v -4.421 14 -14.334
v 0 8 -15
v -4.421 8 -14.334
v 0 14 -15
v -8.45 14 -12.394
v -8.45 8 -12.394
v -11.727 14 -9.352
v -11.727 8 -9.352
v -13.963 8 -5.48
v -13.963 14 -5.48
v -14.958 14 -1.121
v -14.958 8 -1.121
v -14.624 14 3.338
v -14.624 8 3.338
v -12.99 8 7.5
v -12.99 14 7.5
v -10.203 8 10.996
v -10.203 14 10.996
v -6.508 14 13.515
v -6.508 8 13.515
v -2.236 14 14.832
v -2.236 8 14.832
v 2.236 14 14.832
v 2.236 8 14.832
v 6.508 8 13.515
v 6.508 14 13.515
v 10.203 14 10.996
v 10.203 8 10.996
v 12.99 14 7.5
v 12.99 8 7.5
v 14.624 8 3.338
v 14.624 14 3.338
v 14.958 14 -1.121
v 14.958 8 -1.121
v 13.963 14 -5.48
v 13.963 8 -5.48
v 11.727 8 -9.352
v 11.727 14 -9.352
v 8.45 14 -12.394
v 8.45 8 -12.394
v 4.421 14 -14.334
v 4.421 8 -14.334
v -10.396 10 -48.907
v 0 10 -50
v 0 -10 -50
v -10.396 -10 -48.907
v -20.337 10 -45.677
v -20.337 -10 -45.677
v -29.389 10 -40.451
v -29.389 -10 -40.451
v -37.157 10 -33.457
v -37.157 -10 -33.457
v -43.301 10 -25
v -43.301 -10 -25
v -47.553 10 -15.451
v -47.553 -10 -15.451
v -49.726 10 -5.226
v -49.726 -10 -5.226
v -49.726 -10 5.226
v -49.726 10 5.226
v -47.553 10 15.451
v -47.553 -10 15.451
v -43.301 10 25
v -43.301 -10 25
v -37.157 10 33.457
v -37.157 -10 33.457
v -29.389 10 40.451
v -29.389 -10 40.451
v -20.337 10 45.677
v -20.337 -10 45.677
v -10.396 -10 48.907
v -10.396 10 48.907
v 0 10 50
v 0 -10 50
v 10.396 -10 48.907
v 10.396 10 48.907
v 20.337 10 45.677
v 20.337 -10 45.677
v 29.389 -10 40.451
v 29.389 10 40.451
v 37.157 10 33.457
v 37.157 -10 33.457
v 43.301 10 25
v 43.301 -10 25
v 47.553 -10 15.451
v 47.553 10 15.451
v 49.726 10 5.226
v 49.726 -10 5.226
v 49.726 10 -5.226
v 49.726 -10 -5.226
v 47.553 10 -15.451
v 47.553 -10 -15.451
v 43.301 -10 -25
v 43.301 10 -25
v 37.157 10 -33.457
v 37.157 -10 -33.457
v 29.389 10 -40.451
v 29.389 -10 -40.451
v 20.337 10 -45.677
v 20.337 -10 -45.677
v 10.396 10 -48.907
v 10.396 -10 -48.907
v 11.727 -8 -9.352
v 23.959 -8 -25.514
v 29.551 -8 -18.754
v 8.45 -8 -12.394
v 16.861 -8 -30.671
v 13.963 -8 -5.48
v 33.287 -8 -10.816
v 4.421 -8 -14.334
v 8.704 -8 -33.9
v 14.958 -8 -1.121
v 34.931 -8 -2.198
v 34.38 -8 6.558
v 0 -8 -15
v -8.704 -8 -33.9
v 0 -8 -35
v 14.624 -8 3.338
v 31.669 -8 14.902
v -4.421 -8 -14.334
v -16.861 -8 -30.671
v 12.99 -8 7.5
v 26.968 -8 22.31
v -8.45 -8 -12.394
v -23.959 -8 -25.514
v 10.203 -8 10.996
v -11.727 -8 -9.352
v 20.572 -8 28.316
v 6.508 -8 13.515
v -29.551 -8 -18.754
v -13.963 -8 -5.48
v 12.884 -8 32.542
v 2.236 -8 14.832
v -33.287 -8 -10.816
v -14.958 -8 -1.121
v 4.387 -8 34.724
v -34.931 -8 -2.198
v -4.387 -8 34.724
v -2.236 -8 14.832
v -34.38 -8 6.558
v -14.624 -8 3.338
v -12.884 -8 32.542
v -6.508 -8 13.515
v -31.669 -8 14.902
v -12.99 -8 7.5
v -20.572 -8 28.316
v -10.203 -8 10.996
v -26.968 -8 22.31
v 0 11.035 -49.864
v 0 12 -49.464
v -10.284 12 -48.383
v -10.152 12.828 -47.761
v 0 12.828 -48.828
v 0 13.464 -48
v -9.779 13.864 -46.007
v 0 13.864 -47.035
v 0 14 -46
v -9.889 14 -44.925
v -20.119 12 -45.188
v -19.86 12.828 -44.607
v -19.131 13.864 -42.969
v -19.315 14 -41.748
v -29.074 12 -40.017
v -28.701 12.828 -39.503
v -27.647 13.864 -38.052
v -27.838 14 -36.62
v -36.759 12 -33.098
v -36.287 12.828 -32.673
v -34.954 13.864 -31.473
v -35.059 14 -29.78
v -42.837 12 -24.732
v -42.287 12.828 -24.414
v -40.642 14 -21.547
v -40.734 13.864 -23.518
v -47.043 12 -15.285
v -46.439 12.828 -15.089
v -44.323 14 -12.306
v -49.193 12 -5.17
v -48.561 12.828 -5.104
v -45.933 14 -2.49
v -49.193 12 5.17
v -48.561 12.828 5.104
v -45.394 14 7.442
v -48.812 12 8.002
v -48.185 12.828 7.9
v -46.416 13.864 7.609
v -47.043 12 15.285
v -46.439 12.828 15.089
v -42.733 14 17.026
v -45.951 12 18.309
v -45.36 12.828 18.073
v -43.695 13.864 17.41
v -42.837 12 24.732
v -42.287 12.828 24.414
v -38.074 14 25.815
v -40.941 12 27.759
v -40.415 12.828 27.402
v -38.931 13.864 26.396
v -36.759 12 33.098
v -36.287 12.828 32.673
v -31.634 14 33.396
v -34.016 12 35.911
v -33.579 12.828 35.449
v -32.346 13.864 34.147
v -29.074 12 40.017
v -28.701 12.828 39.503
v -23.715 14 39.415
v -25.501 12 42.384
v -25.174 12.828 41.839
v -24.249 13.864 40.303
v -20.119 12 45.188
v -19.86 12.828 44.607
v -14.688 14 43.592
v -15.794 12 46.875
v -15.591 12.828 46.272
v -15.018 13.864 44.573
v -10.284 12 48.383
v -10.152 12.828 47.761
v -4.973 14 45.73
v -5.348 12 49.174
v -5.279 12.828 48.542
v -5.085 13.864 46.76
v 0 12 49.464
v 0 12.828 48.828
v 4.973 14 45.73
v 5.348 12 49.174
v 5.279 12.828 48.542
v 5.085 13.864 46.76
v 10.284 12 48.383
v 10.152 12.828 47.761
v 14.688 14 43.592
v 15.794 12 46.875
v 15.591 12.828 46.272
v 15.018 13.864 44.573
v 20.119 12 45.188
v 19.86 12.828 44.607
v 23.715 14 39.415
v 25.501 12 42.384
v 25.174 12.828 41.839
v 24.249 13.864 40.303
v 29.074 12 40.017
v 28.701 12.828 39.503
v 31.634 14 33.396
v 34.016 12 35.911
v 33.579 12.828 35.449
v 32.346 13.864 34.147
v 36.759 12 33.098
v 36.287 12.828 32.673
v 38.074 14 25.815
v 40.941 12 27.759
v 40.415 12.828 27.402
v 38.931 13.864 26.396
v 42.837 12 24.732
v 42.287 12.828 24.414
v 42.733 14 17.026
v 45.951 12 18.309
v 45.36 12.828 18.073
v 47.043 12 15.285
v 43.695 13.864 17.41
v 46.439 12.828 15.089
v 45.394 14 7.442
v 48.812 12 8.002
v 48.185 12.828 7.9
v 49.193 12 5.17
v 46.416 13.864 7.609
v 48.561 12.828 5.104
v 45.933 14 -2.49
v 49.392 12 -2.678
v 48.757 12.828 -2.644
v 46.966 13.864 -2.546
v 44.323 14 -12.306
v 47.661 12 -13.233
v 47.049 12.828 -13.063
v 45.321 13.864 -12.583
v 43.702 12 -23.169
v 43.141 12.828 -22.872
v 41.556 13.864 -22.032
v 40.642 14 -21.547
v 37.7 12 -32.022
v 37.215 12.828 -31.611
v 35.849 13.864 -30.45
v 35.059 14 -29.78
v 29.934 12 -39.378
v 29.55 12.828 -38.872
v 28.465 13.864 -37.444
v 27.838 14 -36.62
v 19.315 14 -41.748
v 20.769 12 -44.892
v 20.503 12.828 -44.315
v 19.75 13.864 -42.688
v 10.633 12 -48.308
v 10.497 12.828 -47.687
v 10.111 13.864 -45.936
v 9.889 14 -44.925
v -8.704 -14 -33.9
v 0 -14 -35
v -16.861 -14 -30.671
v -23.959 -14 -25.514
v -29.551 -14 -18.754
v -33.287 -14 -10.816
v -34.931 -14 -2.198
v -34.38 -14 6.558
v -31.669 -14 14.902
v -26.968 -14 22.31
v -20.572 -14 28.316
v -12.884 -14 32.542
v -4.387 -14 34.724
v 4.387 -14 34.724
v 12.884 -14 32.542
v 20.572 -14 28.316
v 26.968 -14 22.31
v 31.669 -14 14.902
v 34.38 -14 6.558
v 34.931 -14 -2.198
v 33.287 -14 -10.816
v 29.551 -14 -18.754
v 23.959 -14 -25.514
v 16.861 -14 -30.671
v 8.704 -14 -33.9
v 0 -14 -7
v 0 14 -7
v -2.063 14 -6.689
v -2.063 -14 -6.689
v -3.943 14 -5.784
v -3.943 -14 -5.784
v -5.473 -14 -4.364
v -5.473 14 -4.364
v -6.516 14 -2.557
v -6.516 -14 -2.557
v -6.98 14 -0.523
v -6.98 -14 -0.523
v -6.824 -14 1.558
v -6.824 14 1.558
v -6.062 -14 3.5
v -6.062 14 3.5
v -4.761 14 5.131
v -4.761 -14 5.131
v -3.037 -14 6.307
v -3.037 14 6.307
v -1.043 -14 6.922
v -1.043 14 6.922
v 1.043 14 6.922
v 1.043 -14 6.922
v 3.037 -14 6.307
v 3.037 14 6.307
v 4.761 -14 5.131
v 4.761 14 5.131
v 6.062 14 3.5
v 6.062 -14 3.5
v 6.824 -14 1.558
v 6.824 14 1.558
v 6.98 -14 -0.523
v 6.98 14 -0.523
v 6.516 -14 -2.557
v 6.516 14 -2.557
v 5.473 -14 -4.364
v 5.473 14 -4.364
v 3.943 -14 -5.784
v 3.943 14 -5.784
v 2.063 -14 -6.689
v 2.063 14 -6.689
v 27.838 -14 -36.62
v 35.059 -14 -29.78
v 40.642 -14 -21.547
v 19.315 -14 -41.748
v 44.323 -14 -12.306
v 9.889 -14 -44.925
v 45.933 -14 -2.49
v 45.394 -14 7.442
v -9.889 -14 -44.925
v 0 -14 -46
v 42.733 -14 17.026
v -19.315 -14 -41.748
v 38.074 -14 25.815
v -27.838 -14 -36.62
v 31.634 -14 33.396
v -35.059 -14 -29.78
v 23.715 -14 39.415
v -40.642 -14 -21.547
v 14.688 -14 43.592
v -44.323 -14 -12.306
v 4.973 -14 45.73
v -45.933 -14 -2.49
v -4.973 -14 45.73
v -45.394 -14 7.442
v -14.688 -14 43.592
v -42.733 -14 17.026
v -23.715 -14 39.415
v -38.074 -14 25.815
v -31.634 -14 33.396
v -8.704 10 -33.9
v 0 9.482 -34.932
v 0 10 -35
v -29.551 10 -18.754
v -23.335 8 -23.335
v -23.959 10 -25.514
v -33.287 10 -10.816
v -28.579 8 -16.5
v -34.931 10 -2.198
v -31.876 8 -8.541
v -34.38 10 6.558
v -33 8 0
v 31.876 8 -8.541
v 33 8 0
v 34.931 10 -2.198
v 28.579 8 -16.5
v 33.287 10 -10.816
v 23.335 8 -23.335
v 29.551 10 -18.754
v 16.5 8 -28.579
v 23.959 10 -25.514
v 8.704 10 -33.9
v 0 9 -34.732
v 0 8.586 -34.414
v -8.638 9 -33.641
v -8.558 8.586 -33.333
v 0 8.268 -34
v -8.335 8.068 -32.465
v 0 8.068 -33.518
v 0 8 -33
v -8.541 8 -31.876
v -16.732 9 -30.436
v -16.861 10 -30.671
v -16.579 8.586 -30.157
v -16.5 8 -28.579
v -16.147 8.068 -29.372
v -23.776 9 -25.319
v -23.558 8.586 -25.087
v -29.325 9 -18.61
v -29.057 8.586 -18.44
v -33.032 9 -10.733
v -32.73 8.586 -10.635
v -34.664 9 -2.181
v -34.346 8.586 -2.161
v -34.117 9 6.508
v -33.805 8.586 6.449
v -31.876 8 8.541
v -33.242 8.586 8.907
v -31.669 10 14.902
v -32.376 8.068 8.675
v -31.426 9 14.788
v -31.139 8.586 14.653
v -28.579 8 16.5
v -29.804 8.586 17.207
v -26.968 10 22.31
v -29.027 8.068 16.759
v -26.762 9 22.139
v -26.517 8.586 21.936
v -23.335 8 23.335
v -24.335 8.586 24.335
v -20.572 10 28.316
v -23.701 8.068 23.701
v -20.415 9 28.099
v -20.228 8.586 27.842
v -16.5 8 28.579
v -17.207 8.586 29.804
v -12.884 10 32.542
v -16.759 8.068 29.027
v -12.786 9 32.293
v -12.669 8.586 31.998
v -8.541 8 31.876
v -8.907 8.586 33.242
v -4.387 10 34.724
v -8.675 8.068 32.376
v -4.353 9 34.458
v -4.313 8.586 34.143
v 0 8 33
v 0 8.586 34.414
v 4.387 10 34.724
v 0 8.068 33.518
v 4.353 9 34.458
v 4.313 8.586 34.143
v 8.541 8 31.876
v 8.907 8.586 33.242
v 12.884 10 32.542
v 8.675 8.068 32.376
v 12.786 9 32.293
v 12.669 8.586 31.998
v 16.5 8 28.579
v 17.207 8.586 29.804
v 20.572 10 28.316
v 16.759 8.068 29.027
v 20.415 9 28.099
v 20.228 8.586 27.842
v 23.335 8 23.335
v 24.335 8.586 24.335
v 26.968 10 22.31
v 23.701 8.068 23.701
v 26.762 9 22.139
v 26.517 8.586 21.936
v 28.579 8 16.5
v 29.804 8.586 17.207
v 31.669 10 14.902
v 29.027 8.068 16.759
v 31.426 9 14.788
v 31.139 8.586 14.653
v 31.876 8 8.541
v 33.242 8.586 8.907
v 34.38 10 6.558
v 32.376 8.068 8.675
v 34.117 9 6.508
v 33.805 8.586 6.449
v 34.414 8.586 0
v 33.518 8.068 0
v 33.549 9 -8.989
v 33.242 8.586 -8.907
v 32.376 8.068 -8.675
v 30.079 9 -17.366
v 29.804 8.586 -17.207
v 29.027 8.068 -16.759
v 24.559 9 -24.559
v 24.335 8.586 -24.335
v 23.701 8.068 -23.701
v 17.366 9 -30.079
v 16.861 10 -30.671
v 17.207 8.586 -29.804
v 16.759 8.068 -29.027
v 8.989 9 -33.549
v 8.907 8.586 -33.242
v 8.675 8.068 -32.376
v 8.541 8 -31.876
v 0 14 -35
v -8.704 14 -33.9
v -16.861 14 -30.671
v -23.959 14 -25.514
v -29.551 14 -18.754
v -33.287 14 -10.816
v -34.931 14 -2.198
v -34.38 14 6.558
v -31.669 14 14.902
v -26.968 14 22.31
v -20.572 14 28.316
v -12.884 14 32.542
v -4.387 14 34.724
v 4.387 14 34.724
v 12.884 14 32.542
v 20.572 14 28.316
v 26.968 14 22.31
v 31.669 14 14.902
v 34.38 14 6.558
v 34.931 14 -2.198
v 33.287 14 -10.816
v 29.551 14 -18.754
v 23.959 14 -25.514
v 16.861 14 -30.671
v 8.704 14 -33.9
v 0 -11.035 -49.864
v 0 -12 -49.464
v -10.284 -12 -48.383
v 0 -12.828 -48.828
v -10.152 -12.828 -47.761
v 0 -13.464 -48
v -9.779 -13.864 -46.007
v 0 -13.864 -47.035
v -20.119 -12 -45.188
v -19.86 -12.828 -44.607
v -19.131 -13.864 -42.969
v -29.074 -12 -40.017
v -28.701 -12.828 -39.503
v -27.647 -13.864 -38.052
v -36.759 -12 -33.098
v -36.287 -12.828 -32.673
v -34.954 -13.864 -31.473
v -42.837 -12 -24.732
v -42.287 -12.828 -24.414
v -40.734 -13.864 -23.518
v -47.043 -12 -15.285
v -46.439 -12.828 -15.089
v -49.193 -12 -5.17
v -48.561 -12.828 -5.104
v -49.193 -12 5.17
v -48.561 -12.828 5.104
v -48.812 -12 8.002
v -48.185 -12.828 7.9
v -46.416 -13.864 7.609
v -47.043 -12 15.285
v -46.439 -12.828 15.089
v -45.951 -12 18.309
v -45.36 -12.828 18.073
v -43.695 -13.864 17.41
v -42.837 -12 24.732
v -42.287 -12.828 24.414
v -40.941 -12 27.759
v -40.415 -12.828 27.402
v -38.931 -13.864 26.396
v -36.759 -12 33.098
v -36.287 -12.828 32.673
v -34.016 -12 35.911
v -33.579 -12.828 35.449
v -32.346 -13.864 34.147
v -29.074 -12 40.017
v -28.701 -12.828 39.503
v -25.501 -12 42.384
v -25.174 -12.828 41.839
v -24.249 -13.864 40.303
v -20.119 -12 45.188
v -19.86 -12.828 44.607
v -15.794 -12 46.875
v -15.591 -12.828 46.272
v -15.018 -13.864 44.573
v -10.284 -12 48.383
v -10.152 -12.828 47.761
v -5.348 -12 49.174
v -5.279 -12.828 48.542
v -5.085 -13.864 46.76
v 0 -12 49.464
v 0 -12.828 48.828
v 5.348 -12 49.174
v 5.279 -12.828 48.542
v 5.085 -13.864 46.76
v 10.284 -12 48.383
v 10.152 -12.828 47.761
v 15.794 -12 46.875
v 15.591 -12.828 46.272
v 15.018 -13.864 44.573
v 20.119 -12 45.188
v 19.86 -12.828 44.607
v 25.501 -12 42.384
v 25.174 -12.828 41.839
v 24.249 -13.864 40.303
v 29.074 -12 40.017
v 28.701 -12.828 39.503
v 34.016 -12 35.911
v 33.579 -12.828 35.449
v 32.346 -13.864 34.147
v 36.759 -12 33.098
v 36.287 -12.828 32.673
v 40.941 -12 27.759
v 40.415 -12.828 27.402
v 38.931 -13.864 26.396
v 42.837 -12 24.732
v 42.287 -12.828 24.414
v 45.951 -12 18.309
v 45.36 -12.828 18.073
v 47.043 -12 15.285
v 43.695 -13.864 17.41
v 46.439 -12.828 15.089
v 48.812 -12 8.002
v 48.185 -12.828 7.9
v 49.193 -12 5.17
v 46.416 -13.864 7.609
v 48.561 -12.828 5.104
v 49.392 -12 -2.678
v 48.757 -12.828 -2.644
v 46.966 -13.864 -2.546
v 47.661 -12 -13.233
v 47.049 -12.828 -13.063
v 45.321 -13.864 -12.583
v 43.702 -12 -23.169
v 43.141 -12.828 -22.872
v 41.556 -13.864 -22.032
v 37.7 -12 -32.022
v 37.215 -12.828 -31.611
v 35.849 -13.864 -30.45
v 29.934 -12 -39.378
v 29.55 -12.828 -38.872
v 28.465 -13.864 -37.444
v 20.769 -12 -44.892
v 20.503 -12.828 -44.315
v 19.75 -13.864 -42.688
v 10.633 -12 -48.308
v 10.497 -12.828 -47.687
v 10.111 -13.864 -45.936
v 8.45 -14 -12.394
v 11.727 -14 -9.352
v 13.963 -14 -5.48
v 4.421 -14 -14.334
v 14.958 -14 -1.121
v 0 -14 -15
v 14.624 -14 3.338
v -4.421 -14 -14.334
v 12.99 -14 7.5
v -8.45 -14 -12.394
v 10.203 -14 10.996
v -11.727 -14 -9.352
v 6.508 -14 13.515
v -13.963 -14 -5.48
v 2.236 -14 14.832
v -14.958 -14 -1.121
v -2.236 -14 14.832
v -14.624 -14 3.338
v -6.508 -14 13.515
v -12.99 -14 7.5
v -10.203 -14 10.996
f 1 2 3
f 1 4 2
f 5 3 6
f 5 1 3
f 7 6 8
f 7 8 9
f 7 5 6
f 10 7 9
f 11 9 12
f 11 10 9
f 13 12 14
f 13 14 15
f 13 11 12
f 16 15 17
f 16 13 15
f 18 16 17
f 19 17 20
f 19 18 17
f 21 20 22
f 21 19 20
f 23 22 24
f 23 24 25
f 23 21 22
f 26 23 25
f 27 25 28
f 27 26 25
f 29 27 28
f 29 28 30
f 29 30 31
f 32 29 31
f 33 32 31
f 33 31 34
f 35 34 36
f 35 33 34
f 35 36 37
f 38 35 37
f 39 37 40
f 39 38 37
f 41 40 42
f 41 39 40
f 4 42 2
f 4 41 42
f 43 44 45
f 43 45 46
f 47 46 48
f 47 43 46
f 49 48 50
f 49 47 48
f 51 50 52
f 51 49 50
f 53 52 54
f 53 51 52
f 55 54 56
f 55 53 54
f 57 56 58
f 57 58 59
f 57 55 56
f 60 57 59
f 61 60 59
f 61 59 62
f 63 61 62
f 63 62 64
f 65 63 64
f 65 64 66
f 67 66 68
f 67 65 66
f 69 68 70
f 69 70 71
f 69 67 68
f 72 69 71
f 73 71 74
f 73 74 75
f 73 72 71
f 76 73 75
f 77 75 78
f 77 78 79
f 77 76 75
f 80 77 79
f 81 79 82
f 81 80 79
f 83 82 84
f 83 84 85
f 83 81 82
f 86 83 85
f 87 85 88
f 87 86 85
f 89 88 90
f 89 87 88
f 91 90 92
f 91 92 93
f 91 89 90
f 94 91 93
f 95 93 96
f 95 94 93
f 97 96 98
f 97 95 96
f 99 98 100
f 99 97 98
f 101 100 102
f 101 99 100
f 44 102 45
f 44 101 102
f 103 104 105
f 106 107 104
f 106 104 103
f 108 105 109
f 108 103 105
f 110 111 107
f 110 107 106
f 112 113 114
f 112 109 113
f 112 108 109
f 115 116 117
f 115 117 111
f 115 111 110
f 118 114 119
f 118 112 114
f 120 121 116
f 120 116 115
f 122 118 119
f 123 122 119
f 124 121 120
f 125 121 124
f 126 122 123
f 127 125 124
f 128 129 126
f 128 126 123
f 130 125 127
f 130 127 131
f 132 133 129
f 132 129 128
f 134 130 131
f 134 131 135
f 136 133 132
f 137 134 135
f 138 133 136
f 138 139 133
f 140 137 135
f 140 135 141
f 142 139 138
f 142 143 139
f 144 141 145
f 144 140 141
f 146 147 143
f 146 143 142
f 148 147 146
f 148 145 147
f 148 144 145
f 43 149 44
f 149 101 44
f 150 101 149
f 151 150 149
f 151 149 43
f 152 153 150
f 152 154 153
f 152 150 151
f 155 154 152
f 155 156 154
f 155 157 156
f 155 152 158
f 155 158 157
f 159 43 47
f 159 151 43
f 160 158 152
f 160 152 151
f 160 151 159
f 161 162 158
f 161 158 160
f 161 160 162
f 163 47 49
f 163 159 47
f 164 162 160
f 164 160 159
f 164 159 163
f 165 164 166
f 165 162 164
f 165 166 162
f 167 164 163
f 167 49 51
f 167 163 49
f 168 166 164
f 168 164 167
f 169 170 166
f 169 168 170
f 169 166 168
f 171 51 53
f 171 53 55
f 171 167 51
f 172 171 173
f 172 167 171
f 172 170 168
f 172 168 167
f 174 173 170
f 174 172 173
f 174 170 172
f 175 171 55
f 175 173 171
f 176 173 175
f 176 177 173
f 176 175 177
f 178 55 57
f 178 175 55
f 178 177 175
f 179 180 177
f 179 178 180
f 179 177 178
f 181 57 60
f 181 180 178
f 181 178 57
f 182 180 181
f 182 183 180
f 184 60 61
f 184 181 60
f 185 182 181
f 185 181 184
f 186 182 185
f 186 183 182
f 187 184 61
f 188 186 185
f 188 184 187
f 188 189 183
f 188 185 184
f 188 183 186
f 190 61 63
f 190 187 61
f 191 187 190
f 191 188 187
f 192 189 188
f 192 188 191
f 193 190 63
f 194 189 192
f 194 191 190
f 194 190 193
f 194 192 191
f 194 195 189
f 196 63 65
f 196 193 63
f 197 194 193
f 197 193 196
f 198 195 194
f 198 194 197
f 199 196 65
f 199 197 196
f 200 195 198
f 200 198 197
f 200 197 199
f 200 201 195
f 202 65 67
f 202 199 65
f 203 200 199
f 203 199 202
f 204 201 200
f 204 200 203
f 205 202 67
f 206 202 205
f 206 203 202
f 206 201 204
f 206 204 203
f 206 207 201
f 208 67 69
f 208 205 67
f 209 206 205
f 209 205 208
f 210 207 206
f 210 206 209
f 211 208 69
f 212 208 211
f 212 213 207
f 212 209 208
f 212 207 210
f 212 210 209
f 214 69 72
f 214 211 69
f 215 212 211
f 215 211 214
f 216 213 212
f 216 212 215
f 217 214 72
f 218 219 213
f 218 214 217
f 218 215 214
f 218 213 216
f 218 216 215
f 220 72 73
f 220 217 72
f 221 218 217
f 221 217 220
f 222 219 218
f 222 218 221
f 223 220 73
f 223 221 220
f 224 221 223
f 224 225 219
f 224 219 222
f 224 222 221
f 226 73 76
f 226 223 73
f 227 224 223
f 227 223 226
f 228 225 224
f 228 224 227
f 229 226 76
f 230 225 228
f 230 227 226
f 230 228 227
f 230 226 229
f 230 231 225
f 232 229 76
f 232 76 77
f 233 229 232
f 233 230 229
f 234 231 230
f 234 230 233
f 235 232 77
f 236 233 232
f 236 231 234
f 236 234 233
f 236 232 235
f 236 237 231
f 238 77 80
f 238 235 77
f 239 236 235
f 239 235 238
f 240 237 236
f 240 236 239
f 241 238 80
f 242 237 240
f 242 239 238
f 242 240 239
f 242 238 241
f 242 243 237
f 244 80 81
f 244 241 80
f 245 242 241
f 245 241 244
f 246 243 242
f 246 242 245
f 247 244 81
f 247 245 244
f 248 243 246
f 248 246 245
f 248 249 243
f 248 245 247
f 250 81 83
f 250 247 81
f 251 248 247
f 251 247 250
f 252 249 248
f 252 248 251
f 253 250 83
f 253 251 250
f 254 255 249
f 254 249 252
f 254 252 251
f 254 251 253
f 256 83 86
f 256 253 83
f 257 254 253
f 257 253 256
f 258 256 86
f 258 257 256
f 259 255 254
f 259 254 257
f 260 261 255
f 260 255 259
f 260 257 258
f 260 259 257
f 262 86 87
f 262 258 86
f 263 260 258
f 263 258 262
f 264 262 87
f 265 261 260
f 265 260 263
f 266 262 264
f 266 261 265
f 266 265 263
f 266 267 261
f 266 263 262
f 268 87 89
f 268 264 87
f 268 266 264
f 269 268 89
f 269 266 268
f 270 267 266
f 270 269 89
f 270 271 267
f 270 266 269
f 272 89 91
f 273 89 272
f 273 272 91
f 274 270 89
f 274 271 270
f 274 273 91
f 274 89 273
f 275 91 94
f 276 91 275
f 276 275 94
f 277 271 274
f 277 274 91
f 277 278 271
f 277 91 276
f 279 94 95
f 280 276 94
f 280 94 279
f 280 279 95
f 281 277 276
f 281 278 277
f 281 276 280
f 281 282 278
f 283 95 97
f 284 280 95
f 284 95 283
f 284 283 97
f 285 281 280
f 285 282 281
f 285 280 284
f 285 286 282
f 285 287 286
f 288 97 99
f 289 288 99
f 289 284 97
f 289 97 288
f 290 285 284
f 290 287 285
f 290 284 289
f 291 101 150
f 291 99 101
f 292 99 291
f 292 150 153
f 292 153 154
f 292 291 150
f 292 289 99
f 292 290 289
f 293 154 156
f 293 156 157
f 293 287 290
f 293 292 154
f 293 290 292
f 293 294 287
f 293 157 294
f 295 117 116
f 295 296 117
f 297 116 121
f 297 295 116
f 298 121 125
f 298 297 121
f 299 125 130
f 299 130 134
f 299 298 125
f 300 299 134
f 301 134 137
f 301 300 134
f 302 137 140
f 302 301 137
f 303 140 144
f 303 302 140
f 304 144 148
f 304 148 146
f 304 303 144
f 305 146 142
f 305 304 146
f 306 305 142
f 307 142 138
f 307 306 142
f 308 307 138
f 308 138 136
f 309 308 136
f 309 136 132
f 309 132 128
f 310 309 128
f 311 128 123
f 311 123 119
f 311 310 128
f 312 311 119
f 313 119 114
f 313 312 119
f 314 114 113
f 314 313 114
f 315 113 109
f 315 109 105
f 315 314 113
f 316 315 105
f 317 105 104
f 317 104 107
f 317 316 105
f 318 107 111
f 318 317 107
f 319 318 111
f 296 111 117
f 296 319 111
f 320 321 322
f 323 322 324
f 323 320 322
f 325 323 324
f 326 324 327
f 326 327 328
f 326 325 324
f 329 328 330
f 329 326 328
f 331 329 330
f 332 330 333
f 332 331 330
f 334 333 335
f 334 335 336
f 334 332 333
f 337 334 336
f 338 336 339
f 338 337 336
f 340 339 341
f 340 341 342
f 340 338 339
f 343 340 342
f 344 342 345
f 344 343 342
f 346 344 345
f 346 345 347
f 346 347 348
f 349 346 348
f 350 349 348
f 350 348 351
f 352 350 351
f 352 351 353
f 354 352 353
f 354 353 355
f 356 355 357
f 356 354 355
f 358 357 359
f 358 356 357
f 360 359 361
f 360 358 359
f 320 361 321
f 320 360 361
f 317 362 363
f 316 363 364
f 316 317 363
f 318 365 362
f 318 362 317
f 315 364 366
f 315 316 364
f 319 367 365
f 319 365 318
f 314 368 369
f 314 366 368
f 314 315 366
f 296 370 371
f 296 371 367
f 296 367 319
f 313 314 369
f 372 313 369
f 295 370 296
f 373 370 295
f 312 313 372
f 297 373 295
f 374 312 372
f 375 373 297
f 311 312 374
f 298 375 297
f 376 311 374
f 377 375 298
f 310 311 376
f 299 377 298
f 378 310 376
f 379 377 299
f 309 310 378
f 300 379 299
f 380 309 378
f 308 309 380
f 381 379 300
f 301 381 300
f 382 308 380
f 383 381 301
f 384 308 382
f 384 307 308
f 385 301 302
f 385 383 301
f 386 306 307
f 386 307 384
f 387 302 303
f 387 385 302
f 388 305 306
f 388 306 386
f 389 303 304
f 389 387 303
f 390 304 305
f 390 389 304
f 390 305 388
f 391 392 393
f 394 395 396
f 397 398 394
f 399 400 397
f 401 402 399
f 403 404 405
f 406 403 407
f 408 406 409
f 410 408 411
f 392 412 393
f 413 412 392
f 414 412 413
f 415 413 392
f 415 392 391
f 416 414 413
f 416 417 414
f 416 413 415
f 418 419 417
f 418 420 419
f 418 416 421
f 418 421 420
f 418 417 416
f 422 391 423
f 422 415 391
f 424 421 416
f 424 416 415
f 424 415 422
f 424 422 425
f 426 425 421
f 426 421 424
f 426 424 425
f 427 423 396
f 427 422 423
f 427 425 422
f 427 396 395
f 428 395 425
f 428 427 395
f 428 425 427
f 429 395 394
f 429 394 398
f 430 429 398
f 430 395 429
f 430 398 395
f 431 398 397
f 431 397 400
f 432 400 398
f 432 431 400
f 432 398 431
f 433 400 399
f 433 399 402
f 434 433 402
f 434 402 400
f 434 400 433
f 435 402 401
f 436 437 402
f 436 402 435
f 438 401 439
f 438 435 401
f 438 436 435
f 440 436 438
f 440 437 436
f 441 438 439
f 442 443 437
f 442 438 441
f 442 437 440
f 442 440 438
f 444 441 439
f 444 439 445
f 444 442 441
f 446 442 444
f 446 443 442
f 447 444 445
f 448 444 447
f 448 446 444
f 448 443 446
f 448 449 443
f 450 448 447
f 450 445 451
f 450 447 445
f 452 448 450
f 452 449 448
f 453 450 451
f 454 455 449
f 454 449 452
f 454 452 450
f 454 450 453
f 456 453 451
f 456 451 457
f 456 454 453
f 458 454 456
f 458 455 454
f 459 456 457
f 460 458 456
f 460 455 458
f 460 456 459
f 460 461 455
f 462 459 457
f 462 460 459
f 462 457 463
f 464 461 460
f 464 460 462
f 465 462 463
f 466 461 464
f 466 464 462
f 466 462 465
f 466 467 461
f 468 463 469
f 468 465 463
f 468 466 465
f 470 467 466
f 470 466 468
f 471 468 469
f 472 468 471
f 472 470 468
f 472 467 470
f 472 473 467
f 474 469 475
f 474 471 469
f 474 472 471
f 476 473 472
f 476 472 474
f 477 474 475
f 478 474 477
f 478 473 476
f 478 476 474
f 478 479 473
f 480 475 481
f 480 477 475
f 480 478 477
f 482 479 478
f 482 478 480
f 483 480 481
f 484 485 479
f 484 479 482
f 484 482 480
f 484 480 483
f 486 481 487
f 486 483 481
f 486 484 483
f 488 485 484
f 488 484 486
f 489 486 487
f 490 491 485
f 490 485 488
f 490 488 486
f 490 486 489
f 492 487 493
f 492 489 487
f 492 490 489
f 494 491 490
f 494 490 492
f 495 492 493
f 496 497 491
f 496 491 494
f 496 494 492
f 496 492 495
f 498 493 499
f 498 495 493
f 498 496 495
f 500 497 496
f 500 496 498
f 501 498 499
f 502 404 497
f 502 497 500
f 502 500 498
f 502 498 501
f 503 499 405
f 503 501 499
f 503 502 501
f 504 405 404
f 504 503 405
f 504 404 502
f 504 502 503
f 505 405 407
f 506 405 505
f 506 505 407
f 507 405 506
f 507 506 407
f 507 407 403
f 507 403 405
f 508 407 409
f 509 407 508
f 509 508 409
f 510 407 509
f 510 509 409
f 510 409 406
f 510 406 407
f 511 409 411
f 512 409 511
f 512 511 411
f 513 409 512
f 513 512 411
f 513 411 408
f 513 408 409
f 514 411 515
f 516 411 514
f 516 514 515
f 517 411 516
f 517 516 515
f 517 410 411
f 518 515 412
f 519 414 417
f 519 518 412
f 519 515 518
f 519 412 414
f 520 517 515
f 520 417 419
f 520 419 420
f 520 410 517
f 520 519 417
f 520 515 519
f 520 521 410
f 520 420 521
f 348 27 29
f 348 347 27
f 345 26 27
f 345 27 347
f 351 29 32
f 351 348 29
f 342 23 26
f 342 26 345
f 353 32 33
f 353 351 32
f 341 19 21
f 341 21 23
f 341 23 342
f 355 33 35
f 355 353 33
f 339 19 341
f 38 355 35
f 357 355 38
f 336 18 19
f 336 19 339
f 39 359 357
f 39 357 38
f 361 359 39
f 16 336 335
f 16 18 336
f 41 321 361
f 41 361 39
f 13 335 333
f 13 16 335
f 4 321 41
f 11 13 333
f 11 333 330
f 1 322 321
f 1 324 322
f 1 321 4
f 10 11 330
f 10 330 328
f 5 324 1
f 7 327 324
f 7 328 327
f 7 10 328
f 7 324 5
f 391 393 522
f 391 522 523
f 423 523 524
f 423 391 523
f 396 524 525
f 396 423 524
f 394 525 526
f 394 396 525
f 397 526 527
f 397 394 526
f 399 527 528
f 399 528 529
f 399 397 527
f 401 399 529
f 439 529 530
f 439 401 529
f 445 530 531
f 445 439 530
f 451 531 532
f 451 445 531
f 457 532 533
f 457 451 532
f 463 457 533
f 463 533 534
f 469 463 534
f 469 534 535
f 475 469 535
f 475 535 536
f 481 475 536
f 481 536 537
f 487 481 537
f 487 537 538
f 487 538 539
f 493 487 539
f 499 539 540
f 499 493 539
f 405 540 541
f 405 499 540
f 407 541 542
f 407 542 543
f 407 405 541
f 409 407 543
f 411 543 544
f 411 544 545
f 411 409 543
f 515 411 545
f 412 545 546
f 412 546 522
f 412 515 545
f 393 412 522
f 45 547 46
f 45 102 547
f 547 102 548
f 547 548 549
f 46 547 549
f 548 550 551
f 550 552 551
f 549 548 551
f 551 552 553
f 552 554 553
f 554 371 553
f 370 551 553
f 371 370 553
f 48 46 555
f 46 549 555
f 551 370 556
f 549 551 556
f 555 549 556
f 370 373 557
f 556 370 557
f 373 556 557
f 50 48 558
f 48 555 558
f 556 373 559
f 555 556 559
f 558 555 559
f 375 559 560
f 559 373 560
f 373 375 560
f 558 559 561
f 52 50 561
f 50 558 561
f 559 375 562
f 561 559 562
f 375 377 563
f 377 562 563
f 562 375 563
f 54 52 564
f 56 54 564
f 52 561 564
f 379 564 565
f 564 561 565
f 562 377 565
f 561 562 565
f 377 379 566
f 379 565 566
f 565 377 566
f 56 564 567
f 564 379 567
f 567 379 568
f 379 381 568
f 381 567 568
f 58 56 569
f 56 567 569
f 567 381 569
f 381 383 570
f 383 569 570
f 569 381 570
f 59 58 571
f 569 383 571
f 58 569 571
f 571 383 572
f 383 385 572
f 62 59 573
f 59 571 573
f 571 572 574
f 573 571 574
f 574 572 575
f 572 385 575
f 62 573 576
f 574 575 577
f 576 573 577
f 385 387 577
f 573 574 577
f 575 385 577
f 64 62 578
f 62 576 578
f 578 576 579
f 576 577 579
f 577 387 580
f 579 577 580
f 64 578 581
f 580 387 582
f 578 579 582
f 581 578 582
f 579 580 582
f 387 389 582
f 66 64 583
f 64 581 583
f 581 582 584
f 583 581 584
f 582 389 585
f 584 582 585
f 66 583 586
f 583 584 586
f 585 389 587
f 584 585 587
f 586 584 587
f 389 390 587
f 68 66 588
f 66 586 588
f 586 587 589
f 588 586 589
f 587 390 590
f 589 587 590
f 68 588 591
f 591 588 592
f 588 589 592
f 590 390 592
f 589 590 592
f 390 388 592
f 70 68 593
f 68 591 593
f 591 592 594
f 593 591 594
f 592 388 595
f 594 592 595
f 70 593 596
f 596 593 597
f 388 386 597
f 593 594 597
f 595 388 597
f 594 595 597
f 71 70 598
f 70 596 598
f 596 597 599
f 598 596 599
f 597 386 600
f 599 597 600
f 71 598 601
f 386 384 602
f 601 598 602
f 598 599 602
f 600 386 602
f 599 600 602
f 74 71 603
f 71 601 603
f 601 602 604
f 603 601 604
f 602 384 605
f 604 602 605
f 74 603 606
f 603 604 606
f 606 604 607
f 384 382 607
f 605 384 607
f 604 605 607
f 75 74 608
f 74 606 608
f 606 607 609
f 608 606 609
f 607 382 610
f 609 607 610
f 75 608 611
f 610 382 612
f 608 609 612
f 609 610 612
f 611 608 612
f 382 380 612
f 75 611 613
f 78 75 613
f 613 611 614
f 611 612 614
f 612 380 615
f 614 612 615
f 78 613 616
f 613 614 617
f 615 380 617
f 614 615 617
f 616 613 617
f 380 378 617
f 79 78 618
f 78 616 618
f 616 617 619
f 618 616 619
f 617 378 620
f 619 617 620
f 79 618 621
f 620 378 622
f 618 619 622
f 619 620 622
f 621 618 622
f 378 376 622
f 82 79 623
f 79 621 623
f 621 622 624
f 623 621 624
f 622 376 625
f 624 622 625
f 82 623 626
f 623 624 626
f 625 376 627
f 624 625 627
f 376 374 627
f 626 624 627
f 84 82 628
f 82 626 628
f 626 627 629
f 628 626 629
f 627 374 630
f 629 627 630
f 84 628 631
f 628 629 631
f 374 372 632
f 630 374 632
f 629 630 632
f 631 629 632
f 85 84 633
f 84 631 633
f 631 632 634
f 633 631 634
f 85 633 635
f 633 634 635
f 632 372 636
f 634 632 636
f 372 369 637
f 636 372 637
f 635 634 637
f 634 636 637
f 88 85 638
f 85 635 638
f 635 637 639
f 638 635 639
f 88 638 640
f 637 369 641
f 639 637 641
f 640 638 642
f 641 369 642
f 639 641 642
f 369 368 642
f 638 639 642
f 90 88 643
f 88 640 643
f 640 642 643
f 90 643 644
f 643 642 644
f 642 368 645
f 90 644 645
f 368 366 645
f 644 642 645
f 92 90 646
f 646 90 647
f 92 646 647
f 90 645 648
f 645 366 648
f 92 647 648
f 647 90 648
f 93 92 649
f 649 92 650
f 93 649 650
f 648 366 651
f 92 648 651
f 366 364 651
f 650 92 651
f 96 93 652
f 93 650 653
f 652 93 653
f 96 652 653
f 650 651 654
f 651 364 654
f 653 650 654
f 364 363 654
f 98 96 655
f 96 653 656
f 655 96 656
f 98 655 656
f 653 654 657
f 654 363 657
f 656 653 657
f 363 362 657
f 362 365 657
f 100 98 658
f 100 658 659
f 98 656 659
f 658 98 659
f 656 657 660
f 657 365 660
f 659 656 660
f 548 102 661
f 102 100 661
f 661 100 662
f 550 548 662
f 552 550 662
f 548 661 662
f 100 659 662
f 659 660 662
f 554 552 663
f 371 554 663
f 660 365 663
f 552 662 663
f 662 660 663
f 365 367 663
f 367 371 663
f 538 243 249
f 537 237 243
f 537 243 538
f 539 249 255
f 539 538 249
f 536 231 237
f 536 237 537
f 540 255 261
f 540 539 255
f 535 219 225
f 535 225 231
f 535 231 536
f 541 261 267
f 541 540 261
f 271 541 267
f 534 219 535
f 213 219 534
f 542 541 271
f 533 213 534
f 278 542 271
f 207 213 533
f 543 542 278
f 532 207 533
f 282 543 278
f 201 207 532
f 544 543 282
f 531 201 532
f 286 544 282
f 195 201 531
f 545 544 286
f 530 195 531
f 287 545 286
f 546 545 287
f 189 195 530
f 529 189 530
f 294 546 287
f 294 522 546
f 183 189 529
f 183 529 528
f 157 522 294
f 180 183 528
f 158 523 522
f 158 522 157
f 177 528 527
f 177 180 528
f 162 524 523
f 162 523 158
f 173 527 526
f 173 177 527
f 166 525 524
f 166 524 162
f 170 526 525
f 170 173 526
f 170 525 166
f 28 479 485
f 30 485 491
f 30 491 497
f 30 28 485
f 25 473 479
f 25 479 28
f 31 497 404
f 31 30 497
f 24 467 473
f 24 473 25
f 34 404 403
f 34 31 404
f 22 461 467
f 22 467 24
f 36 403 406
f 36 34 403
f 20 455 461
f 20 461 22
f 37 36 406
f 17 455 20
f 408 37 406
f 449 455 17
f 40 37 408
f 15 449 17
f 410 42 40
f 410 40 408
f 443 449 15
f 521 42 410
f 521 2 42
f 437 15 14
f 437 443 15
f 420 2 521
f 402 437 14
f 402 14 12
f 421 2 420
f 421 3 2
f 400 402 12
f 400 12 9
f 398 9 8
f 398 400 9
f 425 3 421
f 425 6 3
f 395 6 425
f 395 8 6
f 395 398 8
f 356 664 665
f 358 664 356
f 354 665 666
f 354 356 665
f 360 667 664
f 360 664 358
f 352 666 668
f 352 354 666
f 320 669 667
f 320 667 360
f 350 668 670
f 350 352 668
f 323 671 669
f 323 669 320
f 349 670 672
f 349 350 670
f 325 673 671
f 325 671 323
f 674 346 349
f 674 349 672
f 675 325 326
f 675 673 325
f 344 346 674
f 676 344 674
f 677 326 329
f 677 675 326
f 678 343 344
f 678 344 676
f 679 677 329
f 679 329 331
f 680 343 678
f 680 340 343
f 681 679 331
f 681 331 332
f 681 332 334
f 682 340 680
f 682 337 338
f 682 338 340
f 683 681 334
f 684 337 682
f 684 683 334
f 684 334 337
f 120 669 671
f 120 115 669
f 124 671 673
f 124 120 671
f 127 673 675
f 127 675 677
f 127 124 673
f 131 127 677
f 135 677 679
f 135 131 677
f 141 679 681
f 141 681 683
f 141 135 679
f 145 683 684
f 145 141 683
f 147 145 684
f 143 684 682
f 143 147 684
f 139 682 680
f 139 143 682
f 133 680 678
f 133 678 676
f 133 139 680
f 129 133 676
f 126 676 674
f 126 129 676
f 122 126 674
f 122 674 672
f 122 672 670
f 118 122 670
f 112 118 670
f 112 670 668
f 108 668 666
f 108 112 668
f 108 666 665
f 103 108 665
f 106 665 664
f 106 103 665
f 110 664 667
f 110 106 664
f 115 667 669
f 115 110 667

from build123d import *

# Parameters (mm, degrees)
FILLET_1_R = 4
FILLET_2_R = 2


with BuildPart() as part:
    # 草图1 → 旋转1 (revolve)
    with BuildSketch(Plane.XY, mode=Mode.PRIVATE) as revolve_1_sk:
        Polygon((-50, -14), (-50, 14), (-35, 14), (-35, 8), (-15, 8), (-15, 14), (-7, 14), (-7, -14), (-15, -14), (-15, -8), (-35, -8), (-35, -14), align=None)
    revolve(revolve_1_sk.sketch.rotate(Axis((0, 0, 0), (0, 1, 0)), 270), axis=Axis((0, 0, 0), (0, 1, 0)))

    # 圆角1
    fillet_1_edges = [part.edges().sort_by_distance(p)[0] for p in [
        (0, 14, 50),
        (0, -14, 50),
    ]]
    fillet(fillet_1_edges, radius=FILLET_1_R)

    # 圆角2
    fillet_2_edges = [part.edges().sort_by_distance(p)[0] for p in [
        (0, 8, 35),
    ]]
    fillet(fillet_2_edges, radius=FILLET_2_R)


solid = part.part
